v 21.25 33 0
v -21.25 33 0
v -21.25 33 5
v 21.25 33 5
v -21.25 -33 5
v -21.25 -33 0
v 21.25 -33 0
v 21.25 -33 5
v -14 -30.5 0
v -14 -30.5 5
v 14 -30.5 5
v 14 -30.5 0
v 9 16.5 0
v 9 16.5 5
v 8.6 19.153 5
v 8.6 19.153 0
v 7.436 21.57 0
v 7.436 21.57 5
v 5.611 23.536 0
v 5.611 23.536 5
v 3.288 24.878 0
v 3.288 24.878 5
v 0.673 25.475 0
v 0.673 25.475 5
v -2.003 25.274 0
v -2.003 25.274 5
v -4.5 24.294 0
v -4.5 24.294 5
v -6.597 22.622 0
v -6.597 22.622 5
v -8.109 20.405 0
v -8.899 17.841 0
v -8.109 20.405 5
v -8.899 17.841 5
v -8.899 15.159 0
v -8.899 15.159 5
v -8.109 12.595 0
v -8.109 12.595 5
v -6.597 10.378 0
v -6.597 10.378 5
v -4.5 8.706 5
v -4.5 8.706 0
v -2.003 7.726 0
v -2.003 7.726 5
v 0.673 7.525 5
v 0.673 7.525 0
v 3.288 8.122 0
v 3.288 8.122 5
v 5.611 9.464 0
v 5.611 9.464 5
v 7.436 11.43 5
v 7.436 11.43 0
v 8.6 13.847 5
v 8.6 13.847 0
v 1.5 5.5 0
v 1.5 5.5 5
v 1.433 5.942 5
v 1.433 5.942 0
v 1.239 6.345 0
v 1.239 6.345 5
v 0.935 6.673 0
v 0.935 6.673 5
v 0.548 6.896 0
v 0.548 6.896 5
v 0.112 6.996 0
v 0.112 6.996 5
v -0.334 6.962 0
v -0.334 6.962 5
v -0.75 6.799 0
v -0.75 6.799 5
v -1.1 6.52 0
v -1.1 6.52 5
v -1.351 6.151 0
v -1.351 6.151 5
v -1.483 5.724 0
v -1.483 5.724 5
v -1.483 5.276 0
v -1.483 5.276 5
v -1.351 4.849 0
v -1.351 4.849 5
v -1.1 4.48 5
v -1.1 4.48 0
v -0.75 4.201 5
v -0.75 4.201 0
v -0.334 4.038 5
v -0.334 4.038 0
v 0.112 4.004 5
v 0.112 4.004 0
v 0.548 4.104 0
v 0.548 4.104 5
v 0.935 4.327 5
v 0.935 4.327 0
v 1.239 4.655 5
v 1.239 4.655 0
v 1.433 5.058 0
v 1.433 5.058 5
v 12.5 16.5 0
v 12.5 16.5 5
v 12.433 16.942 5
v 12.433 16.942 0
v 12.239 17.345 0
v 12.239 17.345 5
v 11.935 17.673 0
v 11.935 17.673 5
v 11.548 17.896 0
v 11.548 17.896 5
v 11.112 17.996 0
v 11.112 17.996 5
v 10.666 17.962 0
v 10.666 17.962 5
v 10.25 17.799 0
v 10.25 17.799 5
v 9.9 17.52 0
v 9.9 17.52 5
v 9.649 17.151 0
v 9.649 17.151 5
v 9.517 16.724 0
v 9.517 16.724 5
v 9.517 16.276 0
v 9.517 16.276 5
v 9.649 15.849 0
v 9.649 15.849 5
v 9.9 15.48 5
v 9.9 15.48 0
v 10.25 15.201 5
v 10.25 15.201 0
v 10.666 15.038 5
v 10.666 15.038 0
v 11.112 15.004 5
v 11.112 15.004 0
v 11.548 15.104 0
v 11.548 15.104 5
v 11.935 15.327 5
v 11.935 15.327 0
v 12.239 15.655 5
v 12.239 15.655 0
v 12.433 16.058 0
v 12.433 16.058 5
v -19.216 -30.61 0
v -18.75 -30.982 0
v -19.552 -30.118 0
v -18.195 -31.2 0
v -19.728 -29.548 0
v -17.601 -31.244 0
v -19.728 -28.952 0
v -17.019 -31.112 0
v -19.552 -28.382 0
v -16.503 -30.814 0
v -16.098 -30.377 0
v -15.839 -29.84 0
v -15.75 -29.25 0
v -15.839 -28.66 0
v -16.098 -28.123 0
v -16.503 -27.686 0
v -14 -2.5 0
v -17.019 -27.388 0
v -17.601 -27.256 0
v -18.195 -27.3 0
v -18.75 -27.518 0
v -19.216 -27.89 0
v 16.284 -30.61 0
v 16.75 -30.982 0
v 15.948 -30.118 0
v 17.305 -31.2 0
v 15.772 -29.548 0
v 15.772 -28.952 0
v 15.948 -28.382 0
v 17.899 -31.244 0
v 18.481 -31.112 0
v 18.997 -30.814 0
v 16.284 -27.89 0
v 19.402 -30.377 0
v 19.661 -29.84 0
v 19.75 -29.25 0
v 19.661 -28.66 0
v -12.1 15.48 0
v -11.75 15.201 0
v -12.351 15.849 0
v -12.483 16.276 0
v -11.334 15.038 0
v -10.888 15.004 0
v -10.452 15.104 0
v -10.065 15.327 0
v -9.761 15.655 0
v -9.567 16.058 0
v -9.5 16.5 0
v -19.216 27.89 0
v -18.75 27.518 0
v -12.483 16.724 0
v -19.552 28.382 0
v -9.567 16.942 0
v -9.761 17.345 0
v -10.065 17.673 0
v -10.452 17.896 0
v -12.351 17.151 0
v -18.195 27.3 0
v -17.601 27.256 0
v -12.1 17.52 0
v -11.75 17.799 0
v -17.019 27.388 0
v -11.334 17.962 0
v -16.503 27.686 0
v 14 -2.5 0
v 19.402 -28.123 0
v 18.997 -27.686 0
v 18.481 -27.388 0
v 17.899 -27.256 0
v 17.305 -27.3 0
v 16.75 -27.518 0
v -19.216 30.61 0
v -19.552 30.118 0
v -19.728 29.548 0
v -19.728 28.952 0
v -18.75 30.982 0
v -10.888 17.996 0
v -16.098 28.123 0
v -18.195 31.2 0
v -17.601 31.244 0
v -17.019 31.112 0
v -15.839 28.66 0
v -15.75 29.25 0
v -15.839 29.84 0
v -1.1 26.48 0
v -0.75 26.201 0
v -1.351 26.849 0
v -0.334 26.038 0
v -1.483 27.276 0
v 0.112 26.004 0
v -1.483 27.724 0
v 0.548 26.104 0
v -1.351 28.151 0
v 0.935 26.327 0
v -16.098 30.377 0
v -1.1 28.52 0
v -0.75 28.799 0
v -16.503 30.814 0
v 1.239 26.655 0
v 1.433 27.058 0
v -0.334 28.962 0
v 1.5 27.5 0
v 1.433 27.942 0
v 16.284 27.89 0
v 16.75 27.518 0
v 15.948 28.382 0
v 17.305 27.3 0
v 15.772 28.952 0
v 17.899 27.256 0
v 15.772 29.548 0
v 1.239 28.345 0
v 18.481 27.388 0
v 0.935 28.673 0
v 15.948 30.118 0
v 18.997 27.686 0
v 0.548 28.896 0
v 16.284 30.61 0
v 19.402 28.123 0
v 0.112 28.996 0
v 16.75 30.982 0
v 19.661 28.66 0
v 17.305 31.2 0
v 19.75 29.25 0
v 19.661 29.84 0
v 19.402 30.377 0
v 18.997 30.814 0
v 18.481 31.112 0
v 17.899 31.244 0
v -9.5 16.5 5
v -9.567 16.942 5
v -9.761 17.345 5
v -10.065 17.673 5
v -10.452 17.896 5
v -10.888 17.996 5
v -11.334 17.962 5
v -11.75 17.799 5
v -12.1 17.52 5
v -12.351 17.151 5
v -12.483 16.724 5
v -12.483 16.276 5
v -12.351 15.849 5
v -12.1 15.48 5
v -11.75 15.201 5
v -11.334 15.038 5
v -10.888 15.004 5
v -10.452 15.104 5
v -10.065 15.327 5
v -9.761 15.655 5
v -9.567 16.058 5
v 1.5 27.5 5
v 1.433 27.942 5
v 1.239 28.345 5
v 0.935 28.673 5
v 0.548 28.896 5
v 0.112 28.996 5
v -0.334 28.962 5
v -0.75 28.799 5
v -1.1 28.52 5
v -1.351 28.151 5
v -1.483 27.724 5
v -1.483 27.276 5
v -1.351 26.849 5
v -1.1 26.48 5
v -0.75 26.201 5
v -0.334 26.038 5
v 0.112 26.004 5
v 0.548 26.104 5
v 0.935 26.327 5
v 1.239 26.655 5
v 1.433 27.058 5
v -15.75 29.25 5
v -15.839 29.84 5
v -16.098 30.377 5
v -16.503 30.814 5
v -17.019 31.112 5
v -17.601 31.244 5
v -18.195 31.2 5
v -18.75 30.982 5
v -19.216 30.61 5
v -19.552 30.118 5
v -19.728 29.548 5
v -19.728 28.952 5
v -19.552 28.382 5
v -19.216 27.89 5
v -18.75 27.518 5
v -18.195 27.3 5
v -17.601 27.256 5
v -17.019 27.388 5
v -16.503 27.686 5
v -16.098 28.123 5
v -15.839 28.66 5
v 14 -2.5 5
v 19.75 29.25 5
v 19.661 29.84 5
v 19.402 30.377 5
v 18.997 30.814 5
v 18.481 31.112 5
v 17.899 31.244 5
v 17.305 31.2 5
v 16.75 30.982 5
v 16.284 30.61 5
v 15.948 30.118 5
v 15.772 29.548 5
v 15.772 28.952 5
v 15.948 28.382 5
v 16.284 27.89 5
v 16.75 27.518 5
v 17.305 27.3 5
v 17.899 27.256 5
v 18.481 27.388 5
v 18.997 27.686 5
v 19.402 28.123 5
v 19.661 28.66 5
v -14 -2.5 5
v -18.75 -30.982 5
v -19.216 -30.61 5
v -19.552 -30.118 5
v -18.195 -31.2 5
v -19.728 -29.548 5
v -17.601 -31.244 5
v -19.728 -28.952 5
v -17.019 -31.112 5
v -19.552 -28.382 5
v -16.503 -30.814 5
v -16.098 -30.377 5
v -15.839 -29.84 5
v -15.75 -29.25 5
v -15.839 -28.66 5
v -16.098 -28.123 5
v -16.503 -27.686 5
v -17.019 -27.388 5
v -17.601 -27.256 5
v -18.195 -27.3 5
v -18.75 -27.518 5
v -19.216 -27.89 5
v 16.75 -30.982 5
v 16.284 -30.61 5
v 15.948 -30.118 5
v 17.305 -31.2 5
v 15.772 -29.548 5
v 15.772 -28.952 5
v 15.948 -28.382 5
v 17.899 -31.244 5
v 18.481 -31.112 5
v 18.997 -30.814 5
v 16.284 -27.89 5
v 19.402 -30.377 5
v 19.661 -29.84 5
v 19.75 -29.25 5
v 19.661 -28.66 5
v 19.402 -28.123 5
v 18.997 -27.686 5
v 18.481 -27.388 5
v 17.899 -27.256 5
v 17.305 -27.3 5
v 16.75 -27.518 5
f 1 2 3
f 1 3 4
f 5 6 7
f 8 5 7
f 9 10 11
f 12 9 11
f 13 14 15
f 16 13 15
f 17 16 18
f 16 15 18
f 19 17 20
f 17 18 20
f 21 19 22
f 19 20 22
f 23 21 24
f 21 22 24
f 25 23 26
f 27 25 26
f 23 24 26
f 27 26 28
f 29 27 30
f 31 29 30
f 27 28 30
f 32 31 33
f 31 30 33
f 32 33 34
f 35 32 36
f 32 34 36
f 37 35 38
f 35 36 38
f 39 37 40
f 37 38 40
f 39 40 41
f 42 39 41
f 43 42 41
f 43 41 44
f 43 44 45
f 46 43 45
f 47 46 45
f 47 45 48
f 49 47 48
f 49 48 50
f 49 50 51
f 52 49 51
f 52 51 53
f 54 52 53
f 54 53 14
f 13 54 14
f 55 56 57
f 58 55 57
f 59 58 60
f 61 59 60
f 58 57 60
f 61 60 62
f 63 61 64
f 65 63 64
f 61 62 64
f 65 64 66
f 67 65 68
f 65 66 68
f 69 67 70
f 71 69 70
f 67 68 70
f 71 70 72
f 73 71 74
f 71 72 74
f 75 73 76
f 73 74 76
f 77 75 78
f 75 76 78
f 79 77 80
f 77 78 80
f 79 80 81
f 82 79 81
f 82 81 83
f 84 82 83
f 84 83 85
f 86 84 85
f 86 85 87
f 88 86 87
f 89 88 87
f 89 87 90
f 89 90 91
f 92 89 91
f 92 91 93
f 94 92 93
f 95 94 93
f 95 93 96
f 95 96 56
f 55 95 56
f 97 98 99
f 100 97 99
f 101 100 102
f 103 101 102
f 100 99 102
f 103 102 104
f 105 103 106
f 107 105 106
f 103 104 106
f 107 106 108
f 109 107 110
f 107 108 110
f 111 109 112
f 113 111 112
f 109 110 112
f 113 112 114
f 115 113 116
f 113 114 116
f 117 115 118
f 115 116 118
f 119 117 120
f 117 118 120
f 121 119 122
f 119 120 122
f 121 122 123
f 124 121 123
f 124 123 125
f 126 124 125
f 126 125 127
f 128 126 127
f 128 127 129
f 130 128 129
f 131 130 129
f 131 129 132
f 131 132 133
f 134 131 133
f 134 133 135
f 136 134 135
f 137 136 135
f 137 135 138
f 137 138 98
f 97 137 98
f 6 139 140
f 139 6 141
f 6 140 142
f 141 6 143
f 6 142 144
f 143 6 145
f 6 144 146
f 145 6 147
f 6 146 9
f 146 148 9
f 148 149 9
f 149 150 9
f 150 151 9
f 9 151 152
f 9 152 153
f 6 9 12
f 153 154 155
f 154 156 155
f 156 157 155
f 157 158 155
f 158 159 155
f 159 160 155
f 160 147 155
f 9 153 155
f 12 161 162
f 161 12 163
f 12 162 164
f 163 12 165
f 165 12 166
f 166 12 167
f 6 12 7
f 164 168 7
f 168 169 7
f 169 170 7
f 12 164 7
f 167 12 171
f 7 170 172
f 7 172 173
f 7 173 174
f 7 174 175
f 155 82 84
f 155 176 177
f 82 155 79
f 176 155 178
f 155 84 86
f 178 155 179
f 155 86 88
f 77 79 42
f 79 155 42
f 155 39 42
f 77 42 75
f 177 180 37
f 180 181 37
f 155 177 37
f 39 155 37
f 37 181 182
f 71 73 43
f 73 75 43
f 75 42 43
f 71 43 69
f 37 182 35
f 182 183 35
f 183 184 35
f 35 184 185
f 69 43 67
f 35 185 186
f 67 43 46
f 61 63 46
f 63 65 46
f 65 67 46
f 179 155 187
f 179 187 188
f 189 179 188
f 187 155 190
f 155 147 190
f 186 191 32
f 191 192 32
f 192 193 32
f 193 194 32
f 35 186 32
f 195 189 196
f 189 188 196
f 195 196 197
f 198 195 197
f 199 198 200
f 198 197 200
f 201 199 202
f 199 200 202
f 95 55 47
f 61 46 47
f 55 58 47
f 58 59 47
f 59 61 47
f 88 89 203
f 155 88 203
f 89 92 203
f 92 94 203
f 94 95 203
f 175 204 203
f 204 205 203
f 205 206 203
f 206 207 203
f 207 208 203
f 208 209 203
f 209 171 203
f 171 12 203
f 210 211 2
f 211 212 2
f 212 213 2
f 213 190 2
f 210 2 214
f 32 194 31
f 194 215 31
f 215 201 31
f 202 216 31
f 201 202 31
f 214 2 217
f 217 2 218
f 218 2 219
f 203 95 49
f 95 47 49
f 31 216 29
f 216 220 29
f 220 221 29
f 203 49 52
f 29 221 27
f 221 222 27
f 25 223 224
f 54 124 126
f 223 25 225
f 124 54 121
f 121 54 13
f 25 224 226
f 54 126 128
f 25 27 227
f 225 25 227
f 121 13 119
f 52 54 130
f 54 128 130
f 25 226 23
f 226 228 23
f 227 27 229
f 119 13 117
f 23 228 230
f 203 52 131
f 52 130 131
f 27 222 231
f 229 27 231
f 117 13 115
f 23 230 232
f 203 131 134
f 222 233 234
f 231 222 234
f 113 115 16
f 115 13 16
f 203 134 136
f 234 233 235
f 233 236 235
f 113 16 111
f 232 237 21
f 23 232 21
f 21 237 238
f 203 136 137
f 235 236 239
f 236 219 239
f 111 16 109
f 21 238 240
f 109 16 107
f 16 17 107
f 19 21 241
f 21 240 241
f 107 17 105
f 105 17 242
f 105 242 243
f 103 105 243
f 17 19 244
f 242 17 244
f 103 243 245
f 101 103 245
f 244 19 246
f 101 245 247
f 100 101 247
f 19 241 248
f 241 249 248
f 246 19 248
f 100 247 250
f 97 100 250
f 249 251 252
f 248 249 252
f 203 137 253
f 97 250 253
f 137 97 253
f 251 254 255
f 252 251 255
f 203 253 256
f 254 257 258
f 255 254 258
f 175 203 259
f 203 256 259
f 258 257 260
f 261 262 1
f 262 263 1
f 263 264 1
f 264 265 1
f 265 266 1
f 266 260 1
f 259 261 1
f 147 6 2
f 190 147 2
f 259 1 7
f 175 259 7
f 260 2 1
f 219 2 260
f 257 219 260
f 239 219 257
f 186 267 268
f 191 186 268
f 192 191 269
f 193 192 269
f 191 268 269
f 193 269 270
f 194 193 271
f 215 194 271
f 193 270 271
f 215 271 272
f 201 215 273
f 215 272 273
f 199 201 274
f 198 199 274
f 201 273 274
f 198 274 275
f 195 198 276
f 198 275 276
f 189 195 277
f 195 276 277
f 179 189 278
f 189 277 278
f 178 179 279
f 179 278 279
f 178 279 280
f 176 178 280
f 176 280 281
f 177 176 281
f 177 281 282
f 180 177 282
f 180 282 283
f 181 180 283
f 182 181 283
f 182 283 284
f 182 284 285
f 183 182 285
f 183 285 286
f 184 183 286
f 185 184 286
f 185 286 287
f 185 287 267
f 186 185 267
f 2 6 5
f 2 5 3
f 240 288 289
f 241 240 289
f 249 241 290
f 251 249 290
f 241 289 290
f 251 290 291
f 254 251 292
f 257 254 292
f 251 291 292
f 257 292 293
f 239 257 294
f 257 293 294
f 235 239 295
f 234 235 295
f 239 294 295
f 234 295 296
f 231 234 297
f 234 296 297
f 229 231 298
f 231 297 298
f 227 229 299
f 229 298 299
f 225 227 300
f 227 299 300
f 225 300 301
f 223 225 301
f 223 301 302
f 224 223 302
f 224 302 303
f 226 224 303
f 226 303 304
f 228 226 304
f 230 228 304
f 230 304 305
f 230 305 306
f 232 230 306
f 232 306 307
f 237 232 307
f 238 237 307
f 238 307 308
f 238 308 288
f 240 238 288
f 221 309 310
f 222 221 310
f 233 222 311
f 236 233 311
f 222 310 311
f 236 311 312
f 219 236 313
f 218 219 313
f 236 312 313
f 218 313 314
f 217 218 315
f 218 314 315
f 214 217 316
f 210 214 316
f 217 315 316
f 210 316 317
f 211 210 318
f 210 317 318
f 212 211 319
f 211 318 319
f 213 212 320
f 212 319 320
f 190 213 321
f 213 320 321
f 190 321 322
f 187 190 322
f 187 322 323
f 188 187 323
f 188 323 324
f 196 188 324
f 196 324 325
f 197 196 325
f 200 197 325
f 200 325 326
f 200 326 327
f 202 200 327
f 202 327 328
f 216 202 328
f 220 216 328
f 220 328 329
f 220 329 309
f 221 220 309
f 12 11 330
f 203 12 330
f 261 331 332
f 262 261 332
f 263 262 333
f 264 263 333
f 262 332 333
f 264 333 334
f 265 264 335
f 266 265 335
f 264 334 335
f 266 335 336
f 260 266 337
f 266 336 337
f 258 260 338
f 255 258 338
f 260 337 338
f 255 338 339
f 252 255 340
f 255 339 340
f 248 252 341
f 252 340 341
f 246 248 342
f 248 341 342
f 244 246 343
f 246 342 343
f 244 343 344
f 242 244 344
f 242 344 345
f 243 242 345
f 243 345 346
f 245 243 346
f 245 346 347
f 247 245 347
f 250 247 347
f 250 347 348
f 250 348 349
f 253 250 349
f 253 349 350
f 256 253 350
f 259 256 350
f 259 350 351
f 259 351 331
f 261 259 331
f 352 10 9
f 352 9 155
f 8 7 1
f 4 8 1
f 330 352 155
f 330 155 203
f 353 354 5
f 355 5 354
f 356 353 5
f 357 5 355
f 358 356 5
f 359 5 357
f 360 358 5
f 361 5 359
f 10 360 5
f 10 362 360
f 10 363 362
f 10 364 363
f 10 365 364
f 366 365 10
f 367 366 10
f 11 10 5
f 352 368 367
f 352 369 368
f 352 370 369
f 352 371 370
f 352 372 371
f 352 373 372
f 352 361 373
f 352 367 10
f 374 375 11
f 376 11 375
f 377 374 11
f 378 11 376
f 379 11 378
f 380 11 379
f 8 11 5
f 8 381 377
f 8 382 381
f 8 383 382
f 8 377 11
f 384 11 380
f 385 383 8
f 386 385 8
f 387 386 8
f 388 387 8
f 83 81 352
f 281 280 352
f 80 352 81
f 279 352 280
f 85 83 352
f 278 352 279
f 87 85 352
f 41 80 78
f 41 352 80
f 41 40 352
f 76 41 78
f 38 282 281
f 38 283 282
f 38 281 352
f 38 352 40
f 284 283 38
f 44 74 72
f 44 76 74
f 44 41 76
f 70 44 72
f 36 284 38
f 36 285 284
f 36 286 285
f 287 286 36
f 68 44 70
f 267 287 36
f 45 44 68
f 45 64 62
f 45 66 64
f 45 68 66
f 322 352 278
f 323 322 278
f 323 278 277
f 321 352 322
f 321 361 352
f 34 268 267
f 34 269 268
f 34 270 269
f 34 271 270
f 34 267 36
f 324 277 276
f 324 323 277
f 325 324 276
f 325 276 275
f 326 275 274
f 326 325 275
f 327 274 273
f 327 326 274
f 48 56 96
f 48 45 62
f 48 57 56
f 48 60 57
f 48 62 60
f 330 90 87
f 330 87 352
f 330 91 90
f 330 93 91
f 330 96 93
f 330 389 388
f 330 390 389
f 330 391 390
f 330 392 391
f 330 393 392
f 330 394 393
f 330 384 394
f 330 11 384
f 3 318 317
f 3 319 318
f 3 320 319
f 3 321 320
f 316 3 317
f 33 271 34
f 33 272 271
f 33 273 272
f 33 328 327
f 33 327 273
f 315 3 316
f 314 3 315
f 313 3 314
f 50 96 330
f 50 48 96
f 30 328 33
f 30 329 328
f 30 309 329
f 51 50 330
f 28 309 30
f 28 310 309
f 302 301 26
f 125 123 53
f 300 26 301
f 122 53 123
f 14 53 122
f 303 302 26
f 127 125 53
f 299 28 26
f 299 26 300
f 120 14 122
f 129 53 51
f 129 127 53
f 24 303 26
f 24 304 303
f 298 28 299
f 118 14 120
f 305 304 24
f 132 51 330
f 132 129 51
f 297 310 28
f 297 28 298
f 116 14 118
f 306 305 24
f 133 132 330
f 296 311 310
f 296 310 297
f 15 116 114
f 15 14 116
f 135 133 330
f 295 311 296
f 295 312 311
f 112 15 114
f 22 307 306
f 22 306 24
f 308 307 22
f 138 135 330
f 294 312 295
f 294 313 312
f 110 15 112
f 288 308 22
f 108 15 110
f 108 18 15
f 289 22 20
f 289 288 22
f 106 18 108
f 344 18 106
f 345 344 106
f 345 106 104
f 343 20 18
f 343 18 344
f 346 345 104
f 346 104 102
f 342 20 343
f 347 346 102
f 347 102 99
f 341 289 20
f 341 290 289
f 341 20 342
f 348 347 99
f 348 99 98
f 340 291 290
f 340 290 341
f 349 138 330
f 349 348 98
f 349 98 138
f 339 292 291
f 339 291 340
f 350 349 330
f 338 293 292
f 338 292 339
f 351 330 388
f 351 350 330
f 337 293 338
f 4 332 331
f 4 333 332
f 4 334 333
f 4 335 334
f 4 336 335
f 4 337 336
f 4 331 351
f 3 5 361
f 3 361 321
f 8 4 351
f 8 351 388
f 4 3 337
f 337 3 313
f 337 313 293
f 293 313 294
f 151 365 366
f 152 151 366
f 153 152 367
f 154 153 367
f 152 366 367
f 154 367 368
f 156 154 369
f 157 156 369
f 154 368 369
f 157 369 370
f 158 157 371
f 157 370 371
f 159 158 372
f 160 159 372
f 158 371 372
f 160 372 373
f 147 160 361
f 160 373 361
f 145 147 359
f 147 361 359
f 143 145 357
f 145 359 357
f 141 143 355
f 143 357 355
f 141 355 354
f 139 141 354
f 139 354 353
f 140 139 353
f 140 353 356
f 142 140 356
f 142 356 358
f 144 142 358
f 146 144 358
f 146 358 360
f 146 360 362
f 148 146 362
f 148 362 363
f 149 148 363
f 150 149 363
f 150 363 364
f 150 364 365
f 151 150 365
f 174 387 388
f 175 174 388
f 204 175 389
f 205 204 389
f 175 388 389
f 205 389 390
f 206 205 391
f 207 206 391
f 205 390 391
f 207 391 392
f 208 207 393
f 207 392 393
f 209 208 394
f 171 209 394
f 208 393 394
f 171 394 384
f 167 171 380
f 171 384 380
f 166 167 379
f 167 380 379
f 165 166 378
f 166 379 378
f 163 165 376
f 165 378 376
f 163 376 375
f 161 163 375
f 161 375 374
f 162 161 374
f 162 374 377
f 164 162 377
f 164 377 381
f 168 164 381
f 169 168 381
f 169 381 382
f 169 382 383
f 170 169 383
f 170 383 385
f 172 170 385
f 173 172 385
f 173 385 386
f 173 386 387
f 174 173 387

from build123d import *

# Parameters (mm, degrees)
SKETCH1_W           = 42.5
SKETCH1_H           = 66
BOSS_EXTRUDE1_DEPTH = 5
SKETCH2_R           = 9
SKETCH2_R_2         = 1.5
CUT_EXTRUDE1_DEPTH  = 40.56718969
SKETCH3_W           = 28
SKETCH3_H           = 28
CUT_EXTRUDE2_DEPTH  = 40.56718969
SKETCH4_R           = 2
CUT_EXTRUDE3_DEPTH  = 40.56718969


with BuildPart() as part:
    # Sketch1 → Boss-Extrude1 (new body)
    with BuildSketch(Plane.XY):
        Rectangle(SKETCH1_W, SKETCH1_H)
    extrude(amount=BOSS_EXTRUDE1_DEPTH)

    # Sketch2 → Cut-Extrude1 (cut, through all)
    with BuildSketch(Plane.XY.offset(5)):
        with Locations((0, 16.5)):
            Circle(SKETCH2_R)
        with Locations((0, 27.5)):
            Circle(SKETCH2_R_2)
        with Locations((11, 16.5)):
            Circle(SKETCH2_R_2)
        with Locations((-11, 16.5)):
            Circle(SKETCH2_R_2)
        with Locations((0, 5.5)):
            Circle(SKETCH2_R_2)
    extrude(amount=-CUT_EXTRUDE1_DEPTH, mode=Mode.SUBTRACT)

    # Sketch3 → Cut-Extrude2 (cut, through all)
    with BuildSketch(Plane.XY.offset(5)):
        with Locations((0, -16.5)):
            Rectangle(SKETCH3_W, SKETCH3_H)
    extrude(amount=-CUT_EXTRUDE2_DEPTH, mode=Mode.SUBTRACT)

    # Sketch4 → Cut-Extrude3 (cut, through all)
    with BuildSketch(Plane.XY.offset(5)):
        with Locations((-17.75, 29.25)):
            Circle(SKETCH4_R)
        with Locations((17.75, 29.25)):
            Circle(SKETCH4_R)
        with Locations((-17.75, -29.25)):
            Circle(SKETCH4_R)
        with Locations((17.75, -29.25)):
            Circle(SKETCH4_R)
    extrude(amount=-CUT_EXTRUDE3_DEPTH, mode=Mode.SUBTRACT)


solid = part.part
